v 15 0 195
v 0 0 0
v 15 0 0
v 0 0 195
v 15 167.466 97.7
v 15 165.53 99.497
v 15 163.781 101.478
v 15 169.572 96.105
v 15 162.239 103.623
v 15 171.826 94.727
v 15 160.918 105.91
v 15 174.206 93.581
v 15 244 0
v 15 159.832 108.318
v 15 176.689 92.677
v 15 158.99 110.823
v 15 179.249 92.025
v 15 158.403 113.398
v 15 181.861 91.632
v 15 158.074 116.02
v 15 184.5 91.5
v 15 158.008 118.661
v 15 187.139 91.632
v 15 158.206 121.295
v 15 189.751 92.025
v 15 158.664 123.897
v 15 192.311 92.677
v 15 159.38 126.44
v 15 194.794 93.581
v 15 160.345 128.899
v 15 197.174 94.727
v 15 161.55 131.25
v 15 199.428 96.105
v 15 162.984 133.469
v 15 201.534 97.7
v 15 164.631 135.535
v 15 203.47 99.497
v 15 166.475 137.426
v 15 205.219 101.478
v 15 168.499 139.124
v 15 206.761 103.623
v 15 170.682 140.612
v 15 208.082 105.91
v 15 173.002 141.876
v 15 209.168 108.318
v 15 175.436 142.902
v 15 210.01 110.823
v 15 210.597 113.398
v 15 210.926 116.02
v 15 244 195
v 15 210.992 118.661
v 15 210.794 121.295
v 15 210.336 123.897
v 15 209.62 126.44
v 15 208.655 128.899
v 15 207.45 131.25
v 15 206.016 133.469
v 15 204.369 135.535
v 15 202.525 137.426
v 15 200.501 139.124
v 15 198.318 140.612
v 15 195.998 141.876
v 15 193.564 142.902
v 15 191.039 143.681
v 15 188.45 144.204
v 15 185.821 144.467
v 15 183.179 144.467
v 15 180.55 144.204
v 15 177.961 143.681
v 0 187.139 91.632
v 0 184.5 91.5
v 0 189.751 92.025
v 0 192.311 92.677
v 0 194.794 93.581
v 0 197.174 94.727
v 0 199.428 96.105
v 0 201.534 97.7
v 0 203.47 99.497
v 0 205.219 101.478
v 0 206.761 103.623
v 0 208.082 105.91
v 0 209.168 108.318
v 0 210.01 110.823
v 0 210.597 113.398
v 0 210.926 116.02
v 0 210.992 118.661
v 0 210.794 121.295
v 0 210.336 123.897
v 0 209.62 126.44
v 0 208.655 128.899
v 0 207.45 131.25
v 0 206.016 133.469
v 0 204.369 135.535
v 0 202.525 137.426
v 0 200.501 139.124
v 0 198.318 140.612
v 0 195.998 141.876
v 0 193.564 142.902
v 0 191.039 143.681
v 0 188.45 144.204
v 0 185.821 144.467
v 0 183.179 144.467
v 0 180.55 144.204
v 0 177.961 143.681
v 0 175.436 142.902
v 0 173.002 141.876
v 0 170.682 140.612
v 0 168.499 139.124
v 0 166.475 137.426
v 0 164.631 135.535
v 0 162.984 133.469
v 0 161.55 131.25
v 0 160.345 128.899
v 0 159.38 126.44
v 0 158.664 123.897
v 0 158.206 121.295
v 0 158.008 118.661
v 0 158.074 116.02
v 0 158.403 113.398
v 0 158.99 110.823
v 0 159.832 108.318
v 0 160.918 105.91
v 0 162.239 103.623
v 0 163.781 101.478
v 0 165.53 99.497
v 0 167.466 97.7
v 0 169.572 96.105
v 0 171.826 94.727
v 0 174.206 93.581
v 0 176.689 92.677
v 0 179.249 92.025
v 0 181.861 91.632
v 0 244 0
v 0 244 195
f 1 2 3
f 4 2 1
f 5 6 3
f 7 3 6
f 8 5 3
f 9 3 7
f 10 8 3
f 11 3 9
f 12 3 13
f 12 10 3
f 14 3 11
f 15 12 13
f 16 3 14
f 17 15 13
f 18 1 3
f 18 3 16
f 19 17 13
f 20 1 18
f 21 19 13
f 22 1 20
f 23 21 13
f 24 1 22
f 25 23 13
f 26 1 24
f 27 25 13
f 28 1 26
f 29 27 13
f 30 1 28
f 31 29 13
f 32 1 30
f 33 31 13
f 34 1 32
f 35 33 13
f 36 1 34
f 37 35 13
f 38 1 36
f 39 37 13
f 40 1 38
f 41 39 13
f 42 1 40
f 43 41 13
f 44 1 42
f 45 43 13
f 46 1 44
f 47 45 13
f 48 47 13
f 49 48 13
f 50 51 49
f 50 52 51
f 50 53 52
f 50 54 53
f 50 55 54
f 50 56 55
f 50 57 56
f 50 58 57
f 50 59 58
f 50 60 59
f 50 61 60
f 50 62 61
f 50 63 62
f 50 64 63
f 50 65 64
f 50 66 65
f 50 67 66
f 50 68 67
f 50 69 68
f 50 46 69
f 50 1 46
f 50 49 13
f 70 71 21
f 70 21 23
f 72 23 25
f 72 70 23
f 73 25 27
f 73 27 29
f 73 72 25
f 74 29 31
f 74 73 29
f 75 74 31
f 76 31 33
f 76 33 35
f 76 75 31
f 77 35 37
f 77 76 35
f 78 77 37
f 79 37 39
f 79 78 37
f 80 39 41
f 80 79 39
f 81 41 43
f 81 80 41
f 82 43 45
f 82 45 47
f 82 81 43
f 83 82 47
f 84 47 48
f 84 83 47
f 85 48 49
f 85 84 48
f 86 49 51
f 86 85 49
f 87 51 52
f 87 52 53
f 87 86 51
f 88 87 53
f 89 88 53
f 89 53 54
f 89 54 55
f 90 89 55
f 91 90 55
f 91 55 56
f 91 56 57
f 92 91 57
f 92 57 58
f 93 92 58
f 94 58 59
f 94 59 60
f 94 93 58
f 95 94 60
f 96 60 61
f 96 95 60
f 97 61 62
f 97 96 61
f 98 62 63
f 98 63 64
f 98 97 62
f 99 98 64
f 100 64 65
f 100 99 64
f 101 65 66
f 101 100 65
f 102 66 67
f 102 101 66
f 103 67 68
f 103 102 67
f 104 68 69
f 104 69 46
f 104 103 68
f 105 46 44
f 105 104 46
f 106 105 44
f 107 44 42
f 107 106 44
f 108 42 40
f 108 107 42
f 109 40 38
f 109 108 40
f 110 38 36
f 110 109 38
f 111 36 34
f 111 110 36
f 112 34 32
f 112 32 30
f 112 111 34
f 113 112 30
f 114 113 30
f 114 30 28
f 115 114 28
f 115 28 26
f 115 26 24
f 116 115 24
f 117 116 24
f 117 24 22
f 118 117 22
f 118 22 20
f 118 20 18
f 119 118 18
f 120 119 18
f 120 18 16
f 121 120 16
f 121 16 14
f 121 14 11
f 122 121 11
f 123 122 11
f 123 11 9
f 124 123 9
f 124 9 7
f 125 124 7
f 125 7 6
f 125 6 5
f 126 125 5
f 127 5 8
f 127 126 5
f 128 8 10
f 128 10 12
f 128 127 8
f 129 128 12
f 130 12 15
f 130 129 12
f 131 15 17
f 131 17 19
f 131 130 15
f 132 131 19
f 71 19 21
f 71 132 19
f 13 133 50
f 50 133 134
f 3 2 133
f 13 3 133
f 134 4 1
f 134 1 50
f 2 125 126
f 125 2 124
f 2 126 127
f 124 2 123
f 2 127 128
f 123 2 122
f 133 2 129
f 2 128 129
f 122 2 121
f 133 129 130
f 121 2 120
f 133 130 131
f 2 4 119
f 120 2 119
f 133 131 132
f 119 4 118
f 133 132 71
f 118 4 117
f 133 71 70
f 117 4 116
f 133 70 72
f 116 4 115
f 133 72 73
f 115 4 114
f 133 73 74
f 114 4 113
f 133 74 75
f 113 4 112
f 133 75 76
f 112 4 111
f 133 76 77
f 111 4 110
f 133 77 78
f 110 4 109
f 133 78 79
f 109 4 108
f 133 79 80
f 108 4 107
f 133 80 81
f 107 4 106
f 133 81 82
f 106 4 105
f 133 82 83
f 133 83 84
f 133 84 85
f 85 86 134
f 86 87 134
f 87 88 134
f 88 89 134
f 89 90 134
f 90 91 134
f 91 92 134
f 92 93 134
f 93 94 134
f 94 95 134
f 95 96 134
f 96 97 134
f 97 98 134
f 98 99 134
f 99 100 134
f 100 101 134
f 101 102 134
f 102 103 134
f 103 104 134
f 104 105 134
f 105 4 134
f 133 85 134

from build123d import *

# Parameters (mm, degrees)
CROQUIS2_W              = 244
CROQUIS2_H              = 195
CROQUIS2_R              = 26.5
SALIENTE_EXTRUIR1_DEPTH = 15


with BuildPart() as part:
    # Croquis2 → Saliente-Extruir1 (new body)
    with BuildSketch(Plane.YZ):
        with Locations((122, 97.5)):
            Rectangle(CROQUIS2_W, CROQUIS2_H)
        with Locations(Location((184.5, 118, 0), (0, 0, 270))):
            Circle(CROQUIS2_R, mode=Mode.SUBTRACT)
    extrude(amount=SALIENTE_EXTRUIR1_DEPTH)


solid = part.part
